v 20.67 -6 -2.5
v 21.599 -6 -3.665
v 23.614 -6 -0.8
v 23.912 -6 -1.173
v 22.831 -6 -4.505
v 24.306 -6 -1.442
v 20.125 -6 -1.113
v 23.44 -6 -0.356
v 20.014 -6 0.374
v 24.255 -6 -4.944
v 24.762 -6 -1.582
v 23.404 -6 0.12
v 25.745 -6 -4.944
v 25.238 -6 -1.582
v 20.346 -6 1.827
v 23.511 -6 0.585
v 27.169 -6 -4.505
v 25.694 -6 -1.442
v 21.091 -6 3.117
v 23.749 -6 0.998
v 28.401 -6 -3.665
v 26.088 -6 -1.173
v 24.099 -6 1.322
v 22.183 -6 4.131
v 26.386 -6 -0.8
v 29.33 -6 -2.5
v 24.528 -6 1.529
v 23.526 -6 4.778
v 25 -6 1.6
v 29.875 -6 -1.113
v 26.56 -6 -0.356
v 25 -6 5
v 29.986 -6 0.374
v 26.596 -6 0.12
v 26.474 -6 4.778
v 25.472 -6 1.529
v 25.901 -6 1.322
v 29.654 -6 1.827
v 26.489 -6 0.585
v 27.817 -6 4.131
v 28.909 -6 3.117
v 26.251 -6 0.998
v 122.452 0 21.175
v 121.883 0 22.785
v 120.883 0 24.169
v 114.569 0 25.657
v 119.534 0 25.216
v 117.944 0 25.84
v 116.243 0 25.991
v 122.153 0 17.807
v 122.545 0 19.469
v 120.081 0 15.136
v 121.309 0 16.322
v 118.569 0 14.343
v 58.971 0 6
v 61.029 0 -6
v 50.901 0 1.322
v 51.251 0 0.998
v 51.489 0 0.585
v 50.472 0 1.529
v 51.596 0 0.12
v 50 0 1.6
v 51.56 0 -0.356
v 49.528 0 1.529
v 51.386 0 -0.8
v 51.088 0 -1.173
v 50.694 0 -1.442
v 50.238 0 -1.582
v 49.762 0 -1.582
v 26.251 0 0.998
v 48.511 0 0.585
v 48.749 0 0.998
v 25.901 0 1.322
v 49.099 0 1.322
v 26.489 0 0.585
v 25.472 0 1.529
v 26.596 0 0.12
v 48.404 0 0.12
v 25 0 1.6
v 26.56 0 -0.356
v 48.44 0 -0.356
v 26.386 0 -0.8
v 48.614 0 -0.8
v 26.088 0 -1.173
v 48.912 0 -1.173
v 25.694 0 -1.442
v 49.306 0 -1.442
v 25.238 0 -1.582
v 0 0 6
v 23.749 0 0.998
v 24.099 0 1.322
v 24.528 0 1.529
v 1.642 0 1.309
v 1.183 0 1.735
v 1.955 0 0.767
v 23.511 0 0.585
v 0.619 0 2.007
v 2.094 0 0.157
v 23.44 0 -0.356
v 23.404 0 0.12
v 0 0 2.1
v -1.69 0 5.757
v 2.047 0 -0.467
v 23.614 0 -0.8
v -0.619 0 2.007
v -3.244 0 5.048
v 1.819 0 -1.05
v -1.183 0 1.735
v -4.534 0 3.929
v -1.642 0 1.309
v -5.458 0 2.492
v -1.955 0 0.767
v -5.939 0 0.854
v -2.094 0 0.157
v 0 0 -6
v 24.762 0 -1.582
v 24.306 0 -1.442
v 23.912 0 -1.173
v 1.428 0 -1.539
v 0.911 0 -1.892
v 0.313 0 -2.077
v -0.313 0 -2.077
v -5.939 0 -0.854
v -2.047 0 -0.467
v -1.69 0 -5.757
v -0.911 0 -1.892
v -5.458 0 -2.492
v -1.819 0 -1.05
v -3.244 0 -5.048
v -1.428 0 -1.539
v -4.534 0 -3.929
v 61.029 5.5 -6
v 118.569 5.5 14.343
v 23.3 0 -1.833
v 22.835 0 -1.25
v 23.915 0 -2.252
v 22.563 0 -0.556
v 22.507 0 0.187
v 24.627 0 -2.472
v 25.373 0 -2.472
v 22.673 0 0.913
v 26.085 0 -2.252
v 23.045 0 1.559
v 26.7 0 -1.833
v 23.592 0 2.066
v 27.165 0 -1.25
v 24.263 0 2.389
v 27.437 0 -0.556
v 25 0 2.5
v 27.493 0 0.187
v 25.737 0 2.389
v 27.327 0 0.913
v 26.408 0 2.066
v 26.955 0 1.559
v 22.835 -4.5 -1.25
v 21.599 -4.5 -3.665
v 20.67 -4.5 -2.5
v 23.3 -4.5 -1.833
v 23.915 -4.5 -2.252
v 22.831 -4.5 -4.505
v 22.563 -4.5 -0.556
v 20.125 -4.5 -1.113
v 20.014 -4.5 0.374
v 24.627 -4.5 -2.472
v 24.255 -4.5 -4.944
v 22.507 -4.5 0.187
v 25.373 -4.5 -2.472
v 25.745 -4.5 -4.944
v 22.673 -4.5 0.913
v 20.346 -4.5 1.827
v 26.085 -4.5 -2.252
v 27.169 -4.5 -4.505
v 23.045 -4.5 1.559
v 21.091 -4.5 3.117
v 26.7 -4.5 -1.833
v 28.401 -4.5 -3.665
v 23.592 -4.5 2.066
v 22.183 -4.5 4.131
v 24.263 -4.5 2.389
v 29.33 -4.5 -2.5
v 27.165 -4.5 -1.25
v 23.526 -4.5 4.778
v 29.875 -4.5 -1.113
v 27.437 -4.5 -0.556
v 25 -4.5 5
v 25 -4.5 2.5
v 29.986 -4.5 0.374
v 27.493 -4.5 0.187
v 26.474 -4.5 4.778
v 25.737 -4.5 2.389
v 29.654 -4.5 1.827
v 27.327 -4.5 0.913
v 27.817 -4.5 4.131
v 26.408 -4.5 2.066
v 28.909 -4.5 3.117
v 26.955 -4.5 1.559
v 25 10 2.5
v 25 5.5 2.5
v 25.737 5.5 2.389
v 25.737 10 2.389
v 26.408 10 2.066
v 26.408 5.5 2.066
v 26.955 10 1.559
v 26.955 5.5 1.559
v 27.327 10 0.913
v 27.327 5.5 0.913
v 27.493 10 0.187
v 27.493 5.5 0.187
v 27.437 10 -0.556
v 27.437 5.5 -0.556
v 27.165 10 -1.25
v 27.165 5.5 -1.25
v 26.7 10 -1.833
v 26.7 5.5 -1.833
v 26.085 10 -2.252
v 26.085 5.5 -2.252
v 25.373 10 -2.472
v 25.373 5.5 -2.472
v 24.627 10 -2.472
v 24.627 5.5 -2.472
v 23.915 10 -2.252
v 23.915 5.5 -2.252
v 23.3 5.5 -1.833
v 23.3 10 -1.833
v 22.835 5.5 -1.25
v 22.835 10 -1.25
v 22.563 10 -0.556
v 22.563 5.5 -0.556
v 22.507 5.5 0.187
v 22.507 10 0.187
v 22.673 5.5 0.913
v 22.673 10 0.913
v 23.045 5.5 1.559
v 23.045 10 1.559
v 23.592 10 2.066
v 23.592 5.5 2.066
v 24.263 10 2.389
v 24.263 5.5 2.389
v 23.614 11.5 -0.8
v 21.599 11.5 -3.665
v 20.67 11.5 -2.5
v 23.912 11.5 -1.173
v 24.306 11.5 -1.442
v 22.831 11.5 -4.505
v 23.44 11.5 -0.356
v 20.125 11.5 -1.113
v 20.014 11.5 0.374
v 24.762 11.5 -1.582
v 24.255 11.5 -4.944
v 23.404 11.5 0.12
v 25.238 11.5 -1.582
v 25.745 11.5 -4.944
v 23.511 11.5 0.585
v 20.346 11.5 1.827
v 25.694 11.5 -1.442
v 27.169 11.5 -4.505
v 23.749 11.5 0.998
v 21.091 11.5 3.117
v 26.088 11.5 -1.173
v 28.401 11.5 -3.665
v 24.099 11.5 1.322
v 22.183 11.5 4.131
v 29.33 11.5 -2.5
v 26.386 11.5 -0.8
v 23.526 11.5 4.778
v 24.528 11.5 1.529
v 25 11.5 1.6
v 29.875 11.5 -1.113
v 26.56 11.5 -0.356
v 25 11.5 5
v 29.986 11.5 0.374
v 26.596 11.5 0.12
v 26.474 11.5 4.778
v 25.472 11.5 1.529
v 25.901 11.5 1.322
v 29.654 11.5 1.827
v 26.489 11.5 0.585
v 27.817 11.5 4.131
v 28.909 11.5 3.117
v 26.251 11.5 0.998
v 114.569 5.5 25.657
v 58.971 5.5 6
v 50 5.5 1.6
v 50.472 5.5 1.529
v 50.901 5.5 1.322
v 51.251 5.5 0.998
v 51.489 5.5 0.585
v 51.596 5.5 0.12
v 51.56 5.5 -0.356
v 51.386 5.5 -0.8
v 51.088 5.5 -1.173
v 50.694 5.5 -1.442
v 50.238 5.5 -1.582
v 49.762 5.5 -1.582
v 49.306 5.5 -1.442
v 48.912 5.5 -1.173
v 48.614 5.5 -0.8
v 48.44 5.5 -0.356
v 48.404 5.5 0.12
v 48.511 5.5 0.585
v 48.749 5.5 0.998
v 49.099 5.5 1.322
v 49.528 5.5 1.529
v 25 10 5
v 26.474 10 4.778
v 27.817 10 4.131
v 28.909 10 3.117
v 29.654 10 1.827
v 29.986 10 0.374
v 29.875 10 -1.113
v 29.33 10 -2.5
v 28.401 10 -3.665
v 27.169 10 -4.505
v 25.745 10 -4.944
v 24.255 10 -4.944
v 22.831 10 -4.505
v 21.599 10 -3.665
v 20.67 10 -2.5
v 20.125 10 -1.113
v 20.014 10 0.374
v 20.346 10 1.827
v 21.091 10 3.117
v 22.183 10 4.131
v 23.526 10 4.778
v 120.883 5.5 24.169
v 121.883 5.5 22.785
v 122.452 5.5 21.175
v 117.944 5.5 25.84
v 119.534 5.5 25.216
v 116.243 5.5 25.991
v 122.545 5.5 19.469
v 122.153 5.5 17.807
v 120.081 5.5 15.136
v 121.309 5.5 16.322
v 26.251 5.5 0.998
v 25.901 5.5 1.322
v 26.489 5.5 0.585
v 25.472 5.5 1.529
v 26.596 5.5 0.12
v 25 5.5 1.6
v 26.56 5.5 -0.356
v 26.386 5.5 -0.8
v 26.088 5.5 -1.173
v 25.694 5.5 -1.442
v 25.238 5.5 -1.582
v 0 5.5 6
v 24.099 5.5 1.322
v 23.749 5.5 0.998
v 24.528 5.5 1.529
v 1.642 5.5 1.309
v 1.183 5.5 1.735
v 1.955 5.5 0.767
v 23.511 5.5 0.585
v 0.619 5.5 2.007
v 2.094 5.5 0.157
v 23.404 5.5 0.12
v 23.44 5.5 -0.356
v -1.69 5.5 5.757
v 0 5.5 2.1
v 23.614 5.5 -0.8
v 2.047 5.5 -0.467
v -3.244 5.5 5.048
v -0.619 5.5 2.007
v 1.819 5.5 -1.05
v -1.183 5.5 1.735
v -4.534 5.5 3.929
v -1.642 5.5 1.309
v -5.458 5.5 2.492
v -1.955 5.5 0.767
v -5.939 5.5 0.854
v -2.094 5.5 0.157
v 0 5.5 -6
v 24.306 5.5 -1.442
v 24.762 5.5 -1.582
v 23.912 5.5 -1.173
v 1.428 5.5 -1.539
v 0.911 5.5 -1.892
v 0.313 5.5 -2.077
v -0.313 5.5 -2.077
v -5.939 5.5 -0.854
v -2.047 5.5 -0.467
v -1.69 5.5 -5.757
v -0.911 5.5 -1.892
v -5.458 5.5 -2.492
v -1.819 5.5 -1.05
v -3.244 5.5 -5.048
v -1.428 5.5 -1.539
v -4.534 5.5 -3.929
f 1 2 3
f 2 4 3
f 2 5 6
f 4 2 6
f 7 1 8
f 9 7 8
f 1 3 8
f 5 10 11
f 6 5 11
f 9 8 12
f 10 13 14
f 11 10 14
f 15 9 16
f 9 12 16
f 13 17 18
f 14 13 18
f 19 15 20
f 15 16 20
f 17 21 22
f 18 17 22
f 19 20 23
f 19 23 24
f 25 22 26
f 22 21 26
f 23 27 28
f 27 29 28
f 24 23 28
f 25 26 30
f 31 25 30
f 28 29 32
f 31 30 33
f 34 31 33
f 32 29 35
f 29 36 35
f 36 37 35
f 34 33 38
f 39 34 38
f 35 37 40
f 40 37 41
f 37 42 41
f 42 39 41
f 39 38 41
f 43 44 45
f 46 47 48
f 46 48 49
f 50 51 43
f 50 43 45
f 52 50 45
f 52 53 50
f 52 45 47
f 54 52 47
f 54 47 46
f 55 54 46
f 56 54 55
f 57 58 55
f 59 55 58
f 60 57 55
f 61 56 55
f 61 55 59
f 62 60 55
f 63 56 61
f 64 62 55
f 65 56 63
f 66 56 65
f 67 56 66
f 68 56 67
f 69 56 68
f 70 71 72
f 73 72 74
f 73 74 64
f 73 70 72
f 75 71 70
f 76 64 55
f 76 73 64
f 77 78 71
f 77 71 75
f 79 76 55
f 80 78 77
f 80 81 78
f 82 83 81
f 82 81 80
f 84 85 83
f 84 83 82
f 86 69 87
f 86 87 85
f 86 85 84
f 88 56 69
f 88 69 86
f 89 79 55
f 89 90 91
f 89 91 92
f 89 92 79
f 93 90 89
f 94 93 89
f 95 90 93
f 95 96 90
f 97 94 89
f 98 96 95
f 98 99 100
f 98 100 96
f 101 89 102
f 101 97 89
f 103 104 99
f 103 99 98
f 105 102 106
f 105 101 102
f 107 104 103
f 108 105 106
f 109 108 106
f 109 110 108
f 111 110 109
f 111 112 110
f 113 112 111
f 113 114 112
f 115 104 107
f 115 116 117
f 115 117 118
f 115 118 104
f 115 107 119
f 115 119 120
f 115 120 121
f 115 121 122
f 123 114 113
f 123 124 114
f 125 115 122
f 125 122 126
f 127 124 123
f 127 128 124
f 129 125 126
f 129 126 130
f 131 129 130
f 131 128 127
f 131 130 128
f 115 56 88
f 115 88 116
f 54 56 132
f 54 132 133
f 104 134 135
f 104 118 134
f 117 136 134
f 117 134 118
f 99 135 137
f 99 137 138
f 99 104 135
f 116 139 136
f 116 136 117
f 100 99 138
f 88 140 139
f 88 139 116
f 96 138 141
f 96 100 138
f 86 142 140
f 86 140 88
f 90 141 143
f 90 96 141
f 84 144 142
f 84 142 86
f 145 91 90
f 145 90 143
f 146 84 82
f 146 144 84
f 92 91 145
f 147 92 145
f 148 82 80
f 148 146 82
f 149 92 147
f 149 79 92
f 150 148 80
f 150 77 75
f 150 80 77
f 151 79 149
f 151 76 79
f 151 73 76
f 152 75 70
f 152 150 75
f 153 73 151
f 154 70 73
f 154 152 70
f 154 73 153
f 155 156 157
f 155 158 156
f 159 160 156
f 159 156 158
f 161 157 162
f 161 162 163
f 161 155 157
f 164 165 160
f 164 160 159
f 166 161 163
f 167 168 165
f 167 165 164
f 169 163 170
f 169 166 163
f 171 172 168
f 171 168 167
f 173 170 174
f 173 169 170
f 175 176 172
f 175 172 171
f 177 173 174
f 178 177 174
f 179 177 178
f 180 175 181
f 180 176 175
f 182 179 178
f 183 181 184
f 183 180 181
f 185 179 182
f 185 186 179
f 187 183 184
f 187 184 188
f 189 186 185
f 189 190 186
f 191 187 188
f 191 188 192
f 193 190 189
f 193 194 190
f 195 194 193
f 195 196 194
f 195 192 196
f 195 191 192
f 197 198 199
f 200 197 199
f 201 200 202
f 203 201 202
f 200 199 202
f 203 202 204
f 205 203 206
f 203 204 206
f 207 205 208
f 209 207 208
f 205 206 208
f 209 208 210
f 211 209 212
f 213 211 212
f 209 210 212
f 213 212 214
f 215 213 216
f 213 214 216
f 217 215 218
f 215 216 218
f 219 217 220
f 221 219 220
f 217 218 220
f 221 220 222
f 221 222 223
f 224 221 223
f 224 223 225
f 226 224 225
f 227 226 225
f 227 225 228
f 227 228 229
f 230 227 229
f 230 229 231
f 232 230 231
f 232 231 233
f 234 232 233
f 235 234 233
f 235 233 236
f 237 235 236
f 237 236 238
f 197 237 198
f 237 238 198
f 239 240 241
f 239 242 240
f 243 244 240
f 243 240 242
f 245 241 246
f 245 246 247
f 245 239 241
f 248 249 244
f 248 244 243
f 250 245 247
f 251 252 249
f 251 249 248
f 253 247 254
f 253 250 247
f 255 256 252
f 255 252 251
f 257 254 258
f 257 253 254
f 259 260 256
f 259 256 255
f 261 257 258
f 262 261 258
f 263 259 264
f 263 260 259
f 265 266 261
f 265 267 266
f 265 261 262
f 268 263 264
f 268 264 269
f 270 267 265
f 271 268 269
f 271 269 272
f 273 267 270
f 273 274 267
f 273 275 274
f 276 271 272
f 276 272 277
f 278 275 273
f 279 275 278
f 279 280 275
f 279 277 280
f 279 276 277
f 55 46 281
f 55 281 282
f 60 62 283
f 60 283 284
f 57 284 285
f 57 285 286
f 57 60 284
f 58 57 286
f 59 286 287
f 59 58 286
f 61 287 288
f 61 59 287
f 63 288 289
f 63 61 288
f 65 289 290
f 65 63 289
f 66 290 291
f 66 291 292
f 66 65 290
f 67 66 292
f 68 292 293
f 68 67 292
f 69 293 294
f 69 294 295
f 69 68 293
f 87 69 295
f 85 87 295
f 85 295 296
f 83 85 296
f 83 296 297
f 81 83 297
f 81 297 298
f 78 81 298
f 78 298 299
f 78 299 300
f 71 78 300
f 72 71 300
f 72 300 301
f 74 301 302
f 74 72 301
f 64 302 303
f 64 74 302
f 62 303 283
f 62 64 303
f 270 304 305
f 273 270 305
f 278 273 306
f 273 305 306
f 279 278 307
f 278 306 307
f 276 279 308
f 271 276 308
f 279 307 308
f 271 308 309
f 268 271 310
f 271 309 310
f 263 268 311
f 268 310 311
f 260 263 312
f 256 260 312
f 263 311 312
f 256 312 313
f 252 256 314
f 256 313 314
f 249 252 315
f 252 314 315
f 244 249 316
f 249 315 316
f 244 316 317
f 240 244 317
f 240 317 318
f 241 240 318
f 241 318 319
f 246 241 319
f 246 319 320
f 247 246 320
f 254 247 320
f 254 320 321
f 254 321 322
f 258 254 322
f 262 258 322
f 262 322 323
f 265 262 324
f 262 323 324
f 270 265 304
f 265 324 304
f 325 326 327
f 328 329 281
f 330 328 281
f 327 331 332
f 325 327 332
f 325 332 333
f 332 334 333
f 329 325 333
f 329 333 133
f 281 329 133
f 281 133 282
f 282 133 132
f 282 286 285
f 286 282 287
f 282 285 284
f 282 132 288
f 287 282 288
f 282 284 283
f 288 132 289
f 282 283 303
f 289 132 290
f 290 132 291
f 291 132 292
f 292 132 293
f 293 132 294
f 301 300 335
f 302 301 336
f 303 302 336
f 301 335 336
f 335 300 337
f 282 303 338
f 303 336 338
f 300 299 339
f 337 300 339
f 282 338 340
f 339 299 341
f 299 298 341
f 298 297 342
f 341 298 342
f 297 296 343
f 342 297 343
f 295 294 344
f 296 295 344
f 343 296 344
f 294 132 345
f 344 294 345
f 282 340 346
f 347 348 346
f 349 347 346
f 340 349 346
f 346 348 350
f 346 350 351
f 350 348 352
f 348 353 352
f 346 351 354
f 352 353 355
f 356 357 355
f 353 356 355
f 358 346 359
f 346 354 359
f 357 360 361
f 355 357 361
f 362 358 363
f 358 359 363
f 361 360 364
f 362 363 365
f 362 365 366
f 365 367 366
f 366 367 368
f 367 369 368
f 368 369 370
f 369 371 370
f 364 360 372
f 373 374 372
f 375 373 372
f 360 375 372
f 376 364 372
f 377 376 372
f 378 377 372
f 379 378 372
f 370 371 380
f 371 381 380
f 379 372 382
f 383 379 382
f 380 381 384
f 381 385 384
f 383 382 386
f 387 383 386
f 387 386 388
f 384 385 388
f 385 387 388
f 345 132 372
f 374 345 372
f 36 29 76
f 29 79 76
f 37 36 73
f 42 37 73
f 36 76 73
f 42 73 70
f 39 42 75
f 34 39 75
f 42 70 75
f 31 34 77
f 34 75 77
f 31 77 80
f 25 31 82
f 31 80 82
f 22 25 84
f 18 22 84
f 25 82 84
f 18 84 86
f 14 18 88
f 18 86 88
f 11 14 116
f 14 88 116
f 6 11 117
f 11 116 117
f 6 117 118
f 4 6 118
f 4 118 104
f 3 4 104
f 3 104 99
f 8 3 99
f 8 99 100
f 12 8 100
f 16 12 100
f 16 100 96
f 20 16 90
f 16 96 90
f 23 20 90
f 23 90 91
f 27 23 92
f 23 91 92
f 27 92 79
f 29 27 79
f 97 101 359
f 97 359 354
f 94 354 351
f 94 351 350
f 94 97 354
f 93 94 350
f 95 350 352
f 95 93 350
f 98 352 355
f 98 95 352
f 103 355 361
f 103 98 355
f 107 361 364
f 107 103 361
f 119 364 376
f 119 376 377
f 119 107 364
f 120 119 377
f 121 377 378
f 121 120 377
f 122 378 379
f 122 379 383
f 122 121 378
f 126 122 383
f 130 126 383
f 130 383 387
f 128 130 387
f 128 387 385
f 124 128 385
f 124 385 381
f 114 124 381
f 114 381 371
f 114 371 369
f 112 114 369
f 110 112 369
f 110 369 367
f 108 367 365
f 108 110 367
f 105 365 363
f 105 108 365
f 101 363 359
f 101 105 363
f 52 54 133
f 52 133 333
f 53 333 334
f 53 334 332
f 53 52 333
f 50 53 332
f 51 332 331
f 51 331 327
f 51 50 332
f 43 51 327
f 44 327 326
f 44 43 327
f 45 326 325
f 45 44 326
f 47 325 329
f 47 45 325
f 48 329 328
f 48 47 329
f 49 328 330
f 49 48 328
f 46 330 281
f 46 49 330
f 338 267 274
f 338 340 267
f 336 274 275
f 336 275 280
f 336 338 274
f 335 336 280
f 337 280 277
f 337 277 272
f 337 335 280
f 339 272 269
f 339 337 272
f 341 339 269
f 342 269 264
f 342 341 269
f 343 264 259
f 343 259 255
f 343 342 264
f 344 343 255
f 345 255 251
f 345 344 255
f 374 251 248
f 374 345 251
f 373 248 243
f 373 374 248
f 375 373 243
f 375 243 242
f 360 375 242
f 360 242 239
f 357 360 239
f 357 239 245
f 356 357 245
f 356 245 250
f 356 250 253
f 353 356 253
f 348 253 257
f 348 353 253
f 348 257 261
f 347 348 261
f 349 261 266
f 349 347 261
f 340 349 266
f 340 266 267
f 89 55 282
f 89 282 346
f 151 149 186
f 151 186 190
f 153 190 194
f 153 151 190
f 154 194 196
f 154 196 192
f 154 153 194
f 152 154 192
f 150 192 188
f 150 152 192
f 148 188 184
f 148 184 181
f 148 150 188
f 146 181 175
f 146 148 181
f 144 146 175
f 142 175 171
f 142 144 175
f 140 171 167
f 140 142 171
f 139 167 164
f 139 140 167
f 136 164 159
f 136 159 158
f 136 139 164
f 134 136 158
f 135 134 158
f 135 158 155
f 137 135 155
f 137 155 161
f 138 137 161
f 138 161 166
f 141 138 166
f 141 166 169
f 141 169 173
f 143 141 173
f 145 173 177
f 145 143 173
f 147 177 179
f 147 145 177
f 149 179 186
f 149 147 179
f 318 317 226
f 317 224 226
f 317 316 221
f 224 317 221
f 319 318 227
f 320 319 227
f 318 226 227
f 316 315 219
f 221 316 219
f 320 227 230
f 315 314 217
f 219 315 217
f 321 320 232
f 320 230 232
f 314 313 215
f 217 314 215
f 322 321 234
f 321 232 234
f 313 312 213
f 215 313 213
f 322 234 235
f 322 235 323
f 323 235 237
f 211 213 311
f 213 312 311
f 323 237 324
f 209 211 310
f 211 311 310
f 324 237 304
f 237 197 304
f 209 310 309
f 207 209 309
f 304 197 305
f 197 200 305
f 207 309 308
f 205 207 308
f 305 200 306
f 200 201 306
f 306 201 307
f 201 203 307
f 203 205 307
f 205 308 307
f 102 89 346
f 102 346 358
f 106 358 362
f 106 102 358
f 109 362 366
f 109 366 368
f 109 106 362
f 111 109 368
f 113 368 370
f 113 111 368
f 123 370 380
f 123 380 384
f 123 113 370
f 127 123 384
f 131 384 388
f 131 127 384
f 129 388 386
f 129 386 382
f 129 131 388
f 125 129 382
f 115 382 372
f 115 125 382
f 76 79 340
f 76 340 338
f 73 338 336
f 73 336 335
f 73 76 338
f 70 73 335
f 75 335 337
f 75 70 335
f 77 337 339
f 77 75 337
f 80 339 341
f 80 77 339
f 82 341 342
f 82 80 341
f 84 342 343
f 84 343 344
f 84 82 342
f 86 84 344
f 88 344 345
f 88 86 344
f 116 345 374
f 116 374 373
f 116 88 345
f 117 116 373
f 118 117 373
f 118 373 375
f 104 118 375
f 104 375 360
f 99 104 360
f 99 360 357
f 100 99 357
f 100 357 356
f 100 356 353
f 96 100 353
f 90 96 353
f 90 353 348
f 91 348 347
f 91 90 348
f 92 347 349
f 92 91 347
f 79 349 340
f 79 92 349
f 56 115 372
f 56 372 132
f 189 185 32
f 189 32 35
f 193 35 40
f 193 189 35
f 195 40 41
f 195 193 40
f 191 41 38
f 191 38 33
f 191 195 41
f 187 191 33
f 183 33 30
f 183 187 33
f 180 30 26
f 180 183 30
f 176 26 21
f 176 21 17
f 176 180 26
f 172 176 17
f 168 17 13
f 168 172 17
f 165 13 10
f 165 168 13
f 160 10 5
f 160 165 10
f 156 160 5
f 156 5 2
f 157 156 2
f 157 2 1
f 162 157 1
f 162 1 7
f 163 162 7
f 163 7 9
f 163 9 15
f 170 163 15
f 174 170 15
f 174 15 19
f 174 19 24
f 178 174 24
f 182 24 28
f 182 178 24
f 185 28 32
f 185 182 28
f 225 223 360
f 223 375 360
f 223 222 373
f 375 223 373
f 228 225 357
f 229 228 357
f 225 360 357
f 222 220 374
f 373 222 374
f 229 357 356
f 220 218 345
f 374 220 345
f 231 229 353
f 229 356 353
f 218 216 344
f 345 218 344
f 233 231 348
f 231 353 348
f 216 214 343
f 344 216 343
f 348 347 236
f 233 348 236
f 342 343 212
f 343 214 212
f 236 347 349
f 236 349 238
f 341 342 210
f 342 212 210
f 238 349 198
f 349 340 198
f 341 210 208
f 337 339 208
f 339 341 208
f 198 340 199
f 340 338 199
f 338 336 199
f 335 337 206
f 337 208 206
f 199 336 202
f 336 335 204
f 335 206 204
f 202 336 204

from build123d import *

# Parameters (mm, degrees)
SKETCH_1_R      = 2.1
SKETCH_1_R_2    = 1.6
EXTRUDE_1_DEPTH = 5.5
SKETCH_2_R      = 2.5
SKETCH_2_R_2    = 1.6
EXTRUDE_2_DEPTH = 4.5
SKETCH_3_R      = 5
SKETCH_3_R_2    = 1.6
EXTRUDE_4_DEPTH = 1.5


with BuildPart() as part:
    # ｽｹｯﾁ1 → ﾎﾞｽ - 押し出し1 (new body)
    with BuildSketch(Plane(origin=(0, 0, 0), x_dir=(1, 0, 0), z_dir=(0, 1, 0))):
        with BuildLine():
            Line((0, 6), (61.029437252, 6))
            Line((61.029437252, 6), (118.568542495, -14.343145751))
            ThreePointArc((118.568542495, -14.343145751), (122.225396744, -22), (114.568542495, -25.656854249))
            Line((114.568542495, -25.656854249), (58.970562748, -6))
            Line((58.970562748, -6), (0, -6))
            ThreePointArc((0, -6), (-6, 0), (0, 6))
        make_face()
        with Locations(Location((0, 0, 0), (0, 0, 270))):
            Circle(SKETCH_1_R, mode=Mode.SUBTRACT)
        with Locations(Location((50, 0, 0), (0, 0, 270))):
            Circle(SKETCH_1_R_2, mode=Mode.SUBTRACT)
        with Locations(Location((25, 0, 0), (0, 0, 270))):
            Circle(SKETCH_1_R_2, mode=Mode.SUBTRACT)
    extrude(amount=EXTRUDE_1_DEPTH)


with BuildPart() as body_2:
    # ｽｹｯﾁ2 → ﾎﾞｽ - 押し出し2 (new body)
    with BuildSketch(Plane(origin=(0, 5.5, 0), x_dir=(1, 0, 0), z_dir=(0, 1, 0))):
        with Locations(Location((25, 0, 0), (0, 0, 270))):
            Circle(SKETCH_2_R)
        with Locations(Location((25, 0, 0), (0, 0, 270))):
            Circle(SKETCH_2_R_2, mode=Mode.SUBTRACT)
    extrude(amount=EXTRUDE_2_DEPTH)

    # ｽｹｯﾁ3 → ﾎﾞｽ - 押し出し4 (add)
    with BuildSketch(Plane(origin=(0, 10, 0), x_dir=(1, 0, 0), z_dir=(0, 1, 0))):
        with Locations(Location((25, 0, 0), (0, 0, 270))):
            Circle(SKETCH_3_R)
        with Locations(Location((25, 0, 0), (0, 0, 270))):
            Circle(SKETCH_3_R_2, mode=Mode.SUBTRACT)
    extrude(amount=EXTRUDE_4_DEPTH)


with BuildPart() as body_3:
    # ﾐﾗｰ1: mirrored copy
    add(body_2.part.mirror(Plane.ZX.offset(2.75)))


solid = Compound([part.part, body_2.part, body_3.part])
